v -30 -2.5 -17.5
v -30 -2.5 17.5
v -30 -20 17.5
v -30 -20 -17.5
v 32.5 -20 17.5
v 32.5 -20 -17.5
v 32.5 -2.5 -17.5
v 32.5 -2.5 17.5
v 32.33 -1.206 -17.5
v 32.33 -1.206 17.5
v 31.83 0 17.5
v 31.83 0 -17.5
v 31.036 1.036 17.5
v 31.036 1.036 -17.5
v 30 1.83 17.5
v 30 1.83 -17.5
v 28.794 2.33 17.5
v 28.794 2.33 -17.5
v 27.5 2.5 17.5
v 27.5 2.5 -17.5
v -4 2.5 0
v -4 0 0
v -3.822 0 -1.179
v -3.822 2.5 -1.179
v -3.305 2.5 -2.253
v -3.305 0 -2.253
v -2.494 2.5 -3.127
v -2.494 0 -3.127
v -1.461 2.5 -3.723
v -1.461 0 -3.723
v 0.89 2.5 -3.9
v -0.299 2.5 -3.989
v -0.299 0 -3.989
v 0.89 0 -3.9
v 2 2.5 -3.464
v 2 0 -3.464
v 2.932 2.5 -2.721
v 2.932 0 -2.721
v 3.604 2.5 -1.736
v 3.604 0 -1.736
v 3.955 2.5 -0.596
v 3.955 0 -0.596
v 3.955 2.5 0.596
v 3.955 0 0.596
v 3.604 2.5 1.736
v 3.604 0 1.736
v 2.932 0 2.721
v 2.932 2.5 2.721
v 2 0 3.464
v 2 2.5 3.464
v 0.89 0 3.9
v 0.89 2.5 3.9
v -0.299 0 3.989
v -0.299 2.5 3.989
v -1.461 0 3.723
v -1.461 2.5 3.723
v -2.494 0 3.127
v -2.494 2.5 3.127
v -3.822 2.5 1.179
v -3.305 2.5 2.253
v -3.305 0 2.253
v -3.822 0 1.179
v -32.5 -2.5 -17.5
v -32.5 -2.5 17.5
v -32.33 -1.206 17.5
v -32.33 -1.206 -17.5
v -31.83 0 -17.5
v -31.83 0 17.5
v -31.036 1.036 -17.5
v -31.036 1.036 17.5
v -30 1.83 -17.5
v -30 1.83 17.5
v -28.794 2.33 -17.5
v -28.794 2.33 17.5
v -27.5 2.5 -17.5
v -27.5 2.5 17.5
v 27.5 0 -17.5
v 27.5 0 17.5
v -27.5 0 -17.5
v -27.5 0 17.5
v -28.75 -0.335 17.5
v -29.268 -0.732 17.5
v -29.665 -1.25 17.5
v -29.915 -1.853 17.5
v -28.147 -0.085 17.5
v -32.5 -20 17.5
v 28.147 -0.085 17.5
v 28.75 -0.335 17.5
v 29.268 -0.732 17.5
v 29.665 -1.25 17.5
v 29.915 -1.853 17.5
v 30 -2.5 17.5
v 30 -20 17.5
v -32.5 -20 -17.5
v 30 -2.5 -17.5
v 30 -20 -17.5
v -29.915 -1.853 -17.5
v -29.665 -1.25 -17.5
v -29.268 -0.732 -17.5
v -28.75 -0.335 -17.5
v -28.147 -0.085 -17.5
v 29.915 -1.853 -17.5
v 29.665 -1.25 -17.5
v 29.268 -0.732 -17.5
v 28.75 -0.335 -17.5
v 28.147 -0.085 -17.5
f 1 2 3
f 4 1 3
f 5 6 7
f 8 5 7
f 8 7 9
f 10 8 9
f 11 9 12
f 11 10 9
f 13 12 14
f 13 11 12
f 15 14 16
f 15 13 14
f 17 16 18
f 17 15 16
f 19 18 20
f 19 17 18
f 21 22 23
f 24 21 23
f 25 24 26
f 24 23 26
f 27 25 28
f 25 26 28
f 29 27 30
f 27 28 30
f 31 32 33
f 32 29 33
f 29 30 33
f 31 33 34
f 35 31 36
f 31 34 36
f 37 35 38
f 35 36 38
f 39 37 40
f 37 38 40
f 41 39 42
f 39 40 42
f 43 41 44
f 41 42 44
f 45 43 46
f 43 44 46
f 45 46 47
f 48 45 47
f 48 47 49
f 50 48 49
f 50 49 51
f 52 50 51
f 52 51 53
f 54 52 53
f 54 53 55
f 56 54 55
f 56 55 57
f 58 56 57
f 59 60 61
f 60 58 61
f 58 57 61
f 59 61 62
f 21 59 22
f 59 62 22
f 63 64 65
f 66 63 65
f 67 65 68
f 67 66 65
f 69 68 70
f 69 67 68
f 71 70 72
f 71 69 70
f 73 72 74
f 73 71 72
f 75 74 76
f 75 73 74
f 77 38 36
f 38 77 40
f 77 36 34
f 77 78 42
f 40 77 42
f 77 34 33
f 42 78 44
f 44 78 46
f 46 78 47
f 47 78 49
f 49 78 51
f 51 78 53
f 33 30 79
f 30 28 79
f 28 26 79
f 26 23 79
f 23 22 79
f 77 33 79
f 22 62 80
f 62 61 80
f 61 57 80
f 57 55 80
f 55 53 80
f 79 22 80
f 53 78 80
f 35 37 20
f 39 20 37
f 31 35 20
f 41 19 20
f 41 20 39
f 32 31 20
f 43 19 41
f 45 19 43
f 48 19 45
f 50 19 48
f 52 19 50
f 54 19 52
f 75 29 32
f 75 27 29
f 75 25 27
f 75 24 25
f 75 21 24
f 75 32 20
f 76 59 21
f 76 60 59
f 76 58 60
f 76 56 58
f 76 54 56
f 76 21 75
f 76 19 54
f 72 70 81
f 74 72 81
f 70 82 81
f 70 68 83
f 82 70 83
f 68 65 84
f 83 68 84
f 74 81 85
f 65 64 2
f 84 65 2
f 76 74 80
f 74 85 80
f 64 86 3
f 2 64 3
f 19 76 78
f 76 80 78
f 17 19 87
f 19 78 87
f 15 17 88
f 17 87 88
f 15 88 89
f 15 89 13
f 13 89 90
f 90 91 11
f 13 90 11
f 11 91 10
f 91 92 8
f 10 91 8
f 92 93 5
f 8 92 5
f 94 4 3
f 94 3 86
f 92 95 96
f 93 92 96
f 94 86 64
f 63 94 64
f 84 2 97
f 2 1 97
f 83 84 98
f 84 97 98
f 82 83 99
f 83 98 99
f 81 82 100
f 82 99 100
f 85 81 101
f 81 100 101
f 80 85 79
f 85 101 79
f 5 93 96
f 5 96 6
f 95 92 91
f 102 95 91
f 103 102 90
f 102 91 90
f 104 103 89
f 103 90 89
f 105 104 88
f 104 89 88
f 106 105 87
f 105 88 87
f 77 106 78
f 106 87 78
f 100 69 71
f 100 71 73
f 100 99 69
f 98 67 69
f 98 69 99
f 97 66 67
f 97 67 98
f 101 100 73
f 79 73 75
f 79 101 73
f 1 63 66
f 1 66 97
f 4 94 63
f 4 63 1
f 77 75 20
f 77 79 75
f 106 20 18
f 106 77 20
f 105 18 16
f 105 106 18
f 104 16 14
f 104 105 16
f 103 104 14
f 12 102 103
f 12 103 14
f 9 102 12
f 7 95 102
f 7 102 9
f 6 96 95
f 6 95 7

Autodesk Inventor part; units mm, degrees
ref_plane "YZ Plane" through (0, 0, 0) normal (1, 0, 0) x (0, 1, 0)
ref_plane "XZ Plane" through (0, 0, 0) normal (0, 1, 0) x (-1, 0, 0)
ref_plane "XY Plane" through (0, 0, 0) normal (0, 0, 1) x (1, 0, 0)
sketch "Náčrt2" plane through (0, 0, 0) normal (0, 1, 0) x (-1, 0, 0)
  line L0 (30, 17.5) -> (-30, 17.5)
  line L1 (-30, 17.5) -> (-30, -17.5)
  line L2 (-30, -17.5) -> (30, -17.5)
  line L3 (30, -17.5) -> (30, 17.5)
  circle A0 centre (0, 0) radius 4
  point P0 (30, 0)
  point P1 (0, 17.5)
  dimension "d0" = 60
  dimension "d1" = 35
  dimension "d22" = 8
extrude "Vysunutí1" add sketch "Náčrt2" along normal blind 2.5
sketch "Náčrt5" plane through (-30, 0, -17.5) normal (-1, 0, 0) x (0, -1, 0)
  line L0 (0, 35) -> (0, 0)
  line L1 (0, 0) -> (20, 0)
  line L2 (20, 0) -> (20, 35)
  line L3 (20, 35) -> (0, 35)
edge flange "Obruba2" height 22.5 angle 90 thickness 2.5 bend radius 2.5 thickness toward (-1, 0, 0) relief tear relief width 2.5 relief depth 1.25 corner gap 2.5 corner form 0 edges at (-30, 0, 0) (30, 0, 0) wall of the first edge with corners at (-30, 0, 17.5) (-30, 0, -17.5) (-30, -20, -17.5) (-30, -20, 17.5)
bend "Ohyb2"
corner "Roh2"
equation "\"d29\" = ŠířkaVýštipu"
equation "\"d30\" = HloubkaVýštipu"
equation "\"d31\" = MinimálníZbytek"
equation "\"d32\" = PoloměrOhybu"
equation "\"d35\" = PoloměrOhybu"
equation "\"d36\" = VelikostRohovéhoVýštipu"
equation "\"d37\" = VelikostMezery"
equation "\"d38\" = VelikostJacobihoPoloměru"
equation "\"PoloměrOhybu\" = Tloušťka"
equation "\"ŠířkaVýštipu\" = Tloušťka"
equation "\"HloubkaVýštipu\" = 0.5 * Tloušťka"
equation "\"MinimálníZbytek\" = 2 * Tloušťka"
equation "\"PřechodovýPoloměr\" = PoloměrOhybu"
equation "\"VelikostJacobihoPoloměru\" = PoloměrOhybu"
equation "\"VelikostMezery\" = Tloušťka"
equation "\"VelikostRohovéhoVýštipu\" = 10"
equation "\"Tloušťka\" = 2.5"
properties part number "DD_KVD_004_04_A" material "Nerezová ocel"
